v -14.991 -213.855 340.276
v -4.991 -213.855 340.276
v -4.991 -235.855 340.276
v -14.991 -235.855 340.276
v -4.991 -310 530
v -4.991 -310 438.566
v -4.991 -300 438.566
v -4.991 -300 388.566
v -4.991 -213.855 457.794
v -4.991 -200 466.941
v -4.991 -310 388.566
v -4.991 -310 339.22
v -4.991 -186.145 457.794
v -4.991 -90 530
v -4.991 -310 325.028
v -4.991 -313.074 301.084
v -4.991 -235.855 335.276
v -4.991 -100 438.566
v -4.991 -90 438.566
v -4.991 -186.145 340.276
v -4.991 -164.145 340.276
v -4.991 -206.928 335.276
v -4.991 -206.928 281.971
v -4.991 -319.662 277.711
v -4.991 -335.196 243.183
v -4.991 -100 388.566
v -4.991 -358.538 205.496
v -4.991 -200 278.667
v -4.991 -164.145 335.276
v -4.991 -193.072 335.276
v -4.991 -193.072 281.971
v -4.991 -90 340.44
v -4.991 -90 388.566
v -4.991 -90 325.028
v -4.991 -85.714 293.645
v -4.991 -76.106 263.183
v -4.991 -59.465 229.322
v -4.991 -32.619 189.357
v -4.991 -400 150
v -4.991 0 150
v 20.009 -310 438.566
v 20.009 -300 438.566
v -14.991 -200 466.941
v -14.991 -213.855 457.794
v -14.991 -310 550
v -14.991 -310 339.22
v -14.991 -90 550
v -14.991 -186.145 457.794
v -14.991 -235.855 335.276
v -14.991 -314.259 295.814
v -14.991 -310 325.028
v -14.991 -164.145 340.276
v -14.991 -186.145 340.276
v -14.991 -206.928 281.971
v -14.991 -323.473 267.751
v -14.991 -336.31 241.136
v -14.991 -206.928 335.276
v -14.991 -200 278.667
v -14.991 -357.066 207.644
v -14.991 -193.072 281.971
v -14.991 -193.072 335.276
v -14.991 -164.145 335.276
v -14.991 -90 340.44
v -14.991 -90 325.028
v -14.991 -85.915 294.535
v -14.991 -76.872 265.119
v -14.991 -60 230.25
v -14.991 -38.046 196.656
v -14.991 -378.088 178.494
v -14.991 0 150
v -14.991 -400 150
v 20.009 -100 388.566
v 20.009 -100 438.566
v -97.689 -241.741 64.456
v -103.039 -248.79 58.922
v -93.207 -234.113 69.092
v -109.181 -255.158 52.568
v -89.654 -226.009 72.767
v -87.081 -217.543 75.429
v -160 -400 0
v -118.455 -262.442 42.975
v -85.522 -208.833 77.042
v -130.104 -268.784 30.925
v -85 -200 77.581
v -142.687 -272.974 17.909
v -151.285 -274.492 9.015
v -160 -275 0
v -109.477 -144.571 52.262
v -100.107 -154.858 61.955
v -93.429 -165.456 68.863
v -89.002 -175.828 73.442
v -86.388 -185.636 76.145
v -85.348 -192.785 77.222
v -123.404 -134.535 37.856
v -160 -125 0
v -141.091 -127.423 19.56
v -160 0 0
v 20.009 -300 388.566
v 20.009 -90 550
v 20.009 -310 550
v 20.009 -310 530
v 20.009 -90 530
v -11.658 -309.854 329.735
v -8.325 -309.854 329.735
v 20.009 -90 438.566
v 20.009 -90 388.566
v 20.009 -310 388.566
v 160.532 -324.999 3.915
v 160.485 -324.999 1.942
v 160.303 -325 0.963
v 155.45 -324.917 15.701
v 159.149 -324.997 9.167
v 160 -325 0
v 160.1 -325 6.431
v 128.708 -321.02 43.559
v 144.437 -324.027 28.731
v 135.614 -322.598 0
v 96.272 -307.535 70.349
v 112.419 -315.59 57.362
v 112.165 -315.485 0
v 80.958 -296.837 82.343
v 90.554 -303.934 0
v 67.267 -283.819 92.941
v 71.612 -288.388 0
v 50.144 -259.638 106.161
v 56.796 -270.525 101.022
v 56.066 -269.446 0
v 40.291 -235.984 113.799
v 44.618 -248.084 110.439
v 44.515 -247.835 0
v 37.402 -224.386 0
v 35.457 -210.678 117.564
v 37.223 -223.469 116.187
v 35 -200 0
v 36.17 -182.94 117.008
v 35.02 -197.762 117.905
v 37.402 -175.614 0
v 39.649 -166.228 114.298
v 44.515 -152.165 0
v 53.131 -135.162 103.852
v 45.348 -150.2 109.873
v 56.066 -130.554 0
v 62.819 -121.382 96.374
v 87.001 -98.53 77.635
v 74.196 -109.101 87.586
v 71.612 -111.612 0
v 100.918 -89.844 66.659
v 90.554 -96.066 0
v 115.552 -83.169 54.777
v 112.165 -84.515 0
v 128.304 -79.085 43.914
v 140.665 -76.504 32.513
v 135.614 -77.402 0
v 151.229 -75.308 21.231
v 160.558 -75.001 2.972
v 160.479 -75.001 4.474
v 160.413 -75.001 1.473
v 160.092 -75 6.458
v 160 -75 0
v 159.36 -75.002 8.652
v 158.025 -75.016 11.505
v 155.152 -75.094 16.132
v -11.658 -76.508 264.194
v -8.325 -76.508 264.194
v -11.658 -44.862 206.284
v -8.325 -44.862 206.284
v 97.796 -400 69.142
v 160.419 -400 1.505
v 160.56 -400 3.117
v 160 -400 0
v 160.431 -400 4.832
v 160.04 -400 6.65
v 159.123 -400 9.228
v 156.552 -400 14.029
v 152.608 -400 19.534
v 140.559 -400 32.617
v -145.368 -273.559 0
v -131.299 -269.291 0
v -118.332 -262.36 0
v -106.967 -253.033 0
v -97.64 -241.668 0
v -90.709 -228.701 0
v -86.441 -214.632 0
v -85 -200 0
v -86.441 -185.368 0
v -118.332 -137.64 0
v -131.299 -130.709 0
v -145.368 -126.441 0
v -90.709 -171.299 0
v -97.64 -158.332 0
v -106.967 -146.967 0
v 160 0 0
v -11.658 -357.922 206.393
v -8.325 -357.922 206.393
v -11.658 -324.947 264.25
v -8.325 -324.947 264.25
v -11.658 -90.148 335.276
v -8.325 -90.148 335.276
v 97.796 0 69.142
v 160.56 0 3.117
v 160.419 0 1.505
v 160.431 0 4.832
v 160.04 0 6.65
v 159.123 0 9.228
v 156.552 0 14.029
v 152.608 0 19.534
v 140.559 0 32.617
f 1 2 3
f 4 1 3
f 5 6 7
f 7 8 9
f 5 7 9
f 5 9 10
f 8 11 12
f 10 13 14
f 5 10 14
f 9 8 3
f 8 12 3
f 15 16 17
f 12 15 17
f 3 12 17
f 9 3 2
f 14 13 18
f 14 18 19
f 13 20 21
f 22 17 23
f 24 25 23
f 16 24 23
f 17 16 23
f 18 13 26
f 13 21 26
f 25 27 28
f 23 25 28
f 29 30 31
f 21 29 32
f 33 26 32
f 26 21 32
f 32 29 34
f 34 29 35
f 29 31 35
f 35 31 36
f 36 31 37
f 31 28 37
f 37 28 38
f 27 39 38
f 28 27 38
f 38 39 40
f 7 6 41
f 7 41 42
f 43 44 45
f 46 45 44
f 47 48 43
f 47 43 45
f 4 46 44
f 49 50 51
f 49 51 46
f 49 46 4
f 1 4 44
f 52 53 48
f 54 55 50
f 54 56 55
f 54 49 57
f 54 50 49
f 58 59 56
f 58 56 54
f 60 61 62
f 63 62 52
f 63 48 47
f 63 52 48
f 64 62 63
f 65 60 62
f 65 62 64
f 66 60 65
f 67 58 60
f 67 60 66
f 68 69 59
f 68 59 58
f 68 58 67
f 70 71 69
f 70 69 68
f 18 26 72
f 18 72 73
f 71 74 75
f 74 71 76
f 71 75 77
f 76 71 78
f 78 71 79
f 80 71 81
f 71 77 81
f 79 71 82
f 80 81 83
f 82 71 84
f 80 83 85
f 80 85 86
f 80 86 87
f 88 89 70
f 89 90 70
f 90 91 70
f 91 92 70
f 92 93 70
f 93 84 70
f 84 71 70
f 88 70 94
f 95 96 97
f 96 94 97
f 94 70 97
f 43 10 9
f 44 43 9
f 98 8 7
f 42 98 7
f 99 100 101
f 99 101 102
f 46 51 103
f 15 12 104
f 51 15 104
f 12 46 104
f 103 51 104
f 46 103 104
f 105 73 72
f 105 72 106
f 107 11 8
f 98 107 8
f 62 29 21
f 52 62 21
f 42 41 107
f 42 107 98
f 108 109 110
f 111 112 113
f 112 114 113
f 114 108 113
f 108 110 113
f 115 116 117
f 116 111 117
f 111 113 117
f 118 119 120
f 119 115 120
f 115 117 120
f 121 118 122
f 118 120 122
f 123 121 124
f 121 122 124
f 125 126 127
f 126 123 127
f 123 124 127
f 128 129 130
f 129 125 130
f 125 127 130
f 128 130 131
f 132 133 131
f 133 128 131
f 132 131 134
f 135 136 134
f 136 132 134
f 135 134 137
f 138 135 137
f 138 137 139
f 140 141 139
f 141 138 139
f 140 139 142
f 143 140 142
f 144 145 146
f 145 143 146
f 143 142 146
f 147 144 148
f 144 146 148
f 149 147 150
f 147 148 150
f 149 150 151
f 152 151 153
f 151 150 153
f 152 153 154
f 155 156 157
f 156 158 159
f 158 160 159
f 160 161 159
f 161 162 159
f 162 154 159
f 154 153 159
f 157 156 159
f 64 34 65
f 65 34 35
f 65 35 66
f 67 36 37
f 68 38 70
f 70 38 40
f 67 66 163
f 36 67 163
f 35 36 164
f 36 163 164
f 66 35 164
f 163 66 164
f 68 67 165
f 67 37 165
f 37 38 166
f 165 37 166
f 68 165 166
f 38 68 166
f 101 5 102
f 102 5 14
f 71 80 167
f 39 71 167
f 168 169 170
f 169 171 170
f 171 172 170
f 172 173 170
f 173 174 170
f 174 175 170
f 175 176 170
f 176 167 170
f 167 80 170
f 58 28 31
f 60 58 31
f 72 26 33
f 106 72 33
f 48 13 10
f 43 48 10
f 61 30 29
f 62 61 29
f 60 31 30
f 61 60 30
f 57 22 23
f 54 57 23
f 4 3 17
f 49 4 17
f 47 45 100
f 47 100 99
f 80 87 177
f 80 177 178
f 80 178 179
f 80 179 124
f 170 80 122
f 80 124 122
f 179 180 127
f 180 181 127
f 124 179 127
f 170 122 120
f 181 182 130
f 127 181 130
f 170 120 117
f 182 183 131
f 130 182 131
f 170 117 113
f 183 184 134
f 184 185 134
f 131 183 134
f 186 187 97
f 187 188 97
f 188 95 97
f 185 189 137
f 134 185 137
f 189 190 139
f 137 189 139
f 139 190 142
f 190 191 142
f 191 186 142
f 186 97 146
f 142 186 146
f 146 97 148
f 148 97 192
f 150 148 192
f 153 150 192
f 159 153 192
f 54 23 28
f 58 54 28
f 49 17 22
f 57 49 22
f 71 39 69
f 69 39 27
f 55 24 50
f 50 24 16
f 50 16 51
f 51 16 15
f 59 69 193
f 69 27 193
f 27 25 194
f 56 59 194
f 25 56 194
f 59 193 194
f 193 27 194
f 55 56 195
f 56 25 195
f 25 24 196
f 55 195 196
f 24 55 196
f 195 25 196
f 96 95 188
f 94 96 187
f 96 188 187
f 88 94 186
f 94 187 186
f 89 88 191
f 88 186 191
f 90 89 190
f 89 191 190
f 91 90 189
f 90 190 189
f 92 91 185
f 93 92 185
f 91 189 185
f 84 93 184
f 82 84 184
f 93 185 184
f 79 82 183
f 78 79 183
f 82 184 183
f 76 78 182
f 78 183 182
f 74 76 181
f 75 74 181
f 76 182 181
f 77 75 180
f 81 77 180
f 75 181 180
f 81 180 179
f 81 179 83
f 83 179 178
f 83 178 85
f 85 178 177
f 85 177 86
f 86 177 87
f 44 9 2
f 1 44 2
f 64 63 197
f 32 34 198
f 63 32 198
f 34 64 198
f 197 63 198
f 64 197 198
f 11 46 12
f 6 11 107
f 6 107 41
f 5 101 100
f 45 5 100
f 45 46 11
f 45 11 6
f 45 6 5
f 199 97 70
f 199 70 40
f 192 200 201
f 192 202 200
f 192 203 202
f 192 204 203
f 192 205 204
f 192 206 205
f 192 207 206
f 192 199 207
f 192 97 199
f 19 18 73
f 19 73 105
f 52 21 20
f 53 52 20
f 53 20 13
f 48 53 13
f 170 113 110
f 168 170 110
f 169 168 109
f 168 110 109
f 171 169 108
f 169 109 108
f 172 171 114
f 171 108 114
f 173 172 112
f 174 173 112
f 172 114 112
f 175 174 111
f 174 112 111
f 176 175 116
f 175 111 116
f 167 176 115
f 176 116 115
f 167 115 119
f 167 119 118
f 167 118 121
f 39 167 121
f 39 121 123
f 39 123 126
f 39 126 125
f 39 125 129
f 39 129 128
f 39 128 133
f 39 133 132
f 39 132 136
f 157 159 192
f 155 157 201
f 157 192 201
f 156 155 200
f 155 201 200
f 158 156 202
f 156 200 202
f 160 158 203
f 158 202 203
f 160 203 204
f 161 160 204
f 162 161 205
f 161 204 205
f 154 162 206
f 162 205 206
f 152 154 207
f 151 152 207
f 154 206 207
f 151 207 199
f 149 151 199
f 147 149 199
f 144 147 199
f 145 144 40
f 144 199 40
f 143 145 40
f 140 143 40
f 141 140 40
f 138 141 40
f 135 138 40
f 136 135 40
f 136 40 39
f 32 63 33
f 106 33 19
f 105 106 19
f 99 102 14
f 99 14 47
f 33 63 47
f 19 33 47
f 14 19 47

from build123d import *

# Parameters (mm, degrees)
F1_DEPTH  = 400
F2_R      = 75
F2_R_2    = 125
F3_DEPTH  = 160
F4_W      = 10
F4_H      = 400
F5_DEPTH  = 400
F7_DEPTH  = 369
F8_DEPTH  = 744
F9_DEPTH  = 294
F10_DEPTH = 25
F11_W     = 220
F11_H     = 20
F12_DEPTH = 25
F13_W     = 10
F13_H     = 50
F14_DEPTH = 25


with BuildPart() as f1:
    # F0 (on Front) → F1 (new body)
    with BuildSketch(Plane.XZ):
        with BuildLine():
            Line((-10, 0), (0, 0))
            Line((0, 0), (160, 0))
            add(Edge.make_bspline(
                [(160, 0), (168.8577404315, 22.9710926099), (70.8040622396, 86.9003880522), (-4.9911788106, 150)],
                knots=[0.4586039165, 0.4586039165, 0.4586039165, 0.4586039165, 1, 1, 1, 1], degree=3))
            Line((-4.9911788106, 150), (-14.9911788106, 150))
            Line((-14.9911788106, 150), (-160, 0))
            Line((-160, 0), (-60, 0))
            Line((-60, 0), (-10, 0))
        make_face()
    extrude(amount=F1_DEPTH)

    # F2 (on face) → F3 (cut)
    with BuildSketch(Plane(origin=(0, 0, 0), x_dir=(1, 0, 0), z_dir=(0, 0, -1))):
        with Locations((-160, 200)):
            Circle(F2_R)
        with Locations((160, 200)):
            Circle(F2_R_2)
    extrude(amount=-F3_DEPTH, mode=Mode.SUBTRACT)

    # F4 (on face) → F5 (join)
    with BuildSketch(Plane.XY.offset(150)):
        with Locations((-9.9911788106, -200)):
            Rectangle(F4_W, F4_H)
    extrude(amount=F5_DEPTH)

    # F6 (on face) → F7 (cut)
    with BuildSketch(Plane.YZ.offset(-4.9911788106)):
        with BuildLine():
            Line((-400, 550), (-400, 150))
            add(Edge.make_bspline(
                [(-400, 150), (-356.3451728041, 206.1467944777), (-312.9584078924, 262.3039541318), (-310, 325.0278234482)],
                knots=[0, 0, 0, 0, 0.4740286783, 0.4740286783, 0.4740286783, 0.4740286783], degree=3))
            Line((-310, 325.0278234482), (-310, 339.2202581751))
            add(Edge.make_bspline(
                [(-310, 339.2202581751), (-312.9911644459, 405.1052836748), (-356.3650932552, 477.5474537124), (-400, 550)],
                knots=[0.5095094707, 0.5095094707, 0.5095094707, 0.5095094707, 1, 1, 1, 1], degree=3))
        make_face()
        with BuildLine():
            Line((0, 550), (-90, 550))
            Line((-90, 550), (-90, 530))
            Line((-90, 530), (-90, 340.4403127563))
            add(Edge.make_bspline(
                [(0, 550), (-49.5785227153, 477.7428221558), (-87.2010209493, 405.969304948), (-90, 340.4403127563)],
                knots=[0, 0, 0, 0, 0.4874574601, 0.4874574601, 0.4874574601, 0.4874574601], degree=3))
        make_face()
        with BuildLine():
            Line((-310, 339.2202581751), (-310, 325.0278234482))
            add(Edge.make_bspline(
                [(-310, 325.0278234482), (-309.7785647553, 329.7226714383), (-309.7836270458, 334.4543090401), (-310, 339.2202581751)],
                knots=[0.4740286783, 0.4740286783, 0.4740286783, 0.4740286783, 0.5095094707, 0.5095094707, 0.5095094707, 0.5095094707], degree=3))
        make_face()
        with BuildLine():
            Line((-310, 550), (-400, 550))
            add(Edge.make_bspline(
                [(-310, 339.2202581751), (-312.9911644459, 405.1052836748), (-356.3650932552, 477.5474537124), (-400, 550)],
                knots=[0.5095094707, 0.5095094707, 0.5095094707, 0.5095094707, 1, 1, 1, 1], degree=3))
            Line((-310, 339.2202581751), (-310, 530))
            Line((-310, 530), (-310, 550))
        make_face()
        with BuildLine():
            Line((0, 150), (0, 550))
            add(Edge.make_bspline(
                [(0, 550), (-49.5785227153, 477.7428221558), (-87.2010209493, 405.969304948), (-90, 340.4403127563)],
                knots=[0, 0, 0, 0, 0.4874574601, 0.4874574601, 0.4874574601, 0.4874574601], degree=3))
            Line((-90, 340.4403127563), (-90, 325.0278234482))
            add(Edge.make_bspline(
                [(-90, 325.0278234482), (-87.2318561535, 262.2986085933), (-49.8238669759, 205.9050330021), (0, 150)],
                knots=[0.5259713217, 0.5259713217, 0.5259713217, 0.5259713217, 1, 1, 1, 1], degree=3))
        make_face()
        with BuildLine():
            Line((-90, 325.0278234482), (-90, 340.4403127563))
            add(Edge.make_bspline(
                [(-90, 340.4403127563), (-90.2211464603, 335.2628875556), (-90.224906032, 330.1244439943), (-90, 325.0278234482)],
                knots=[0.4874574601, 0.4874574601, 0.4874574601, 0.4874574601, 0.5259713217, 0.5259713217, 0.5259713217, 0.5259713217], degree=3))
        make_face()
        Polygon((-186.1447365284, 340.2760970592), (-186.1447365284, 457.7941475637), (-200, 466.9407904148), (-213.8552634716, 457.7941475637), (-213.8552634716, 340.2760970592), (-225.8552634716, 340.2760970592), (-235.8552634716, 340.2760970592), (-235.8552634716, 335.2760970592), (-213.8552634716, 335.2760970592), (-206.9276317358, 335.2760970592), (-206.9276317358, 281.9714009762), (-200, 278.6667048931), (-193.0723682642, 281.9714009762), (-193.0723682642, 335.2760970592), (-186.1447365284, 335.2760970592), (-164.1447365284, 335.2760970592), (-164.1447365284, 340.2760970592), (-174.1447365284, 340.2760970592), align=None)
    extrude(amount=-F7_DEPTH, mode=Mode.SUBTRACT)

    # F6 (on face) → F8 (cut)
    with BuildSketch(Plane.YZ.offset(-4.9911788106)):
        with BuildLine():
            Line((-400, 550), (-400, 150))
            add(Edge.make_bspline(
                [(-400, 150), (-356.3451728041, 206.1467944777), (-312.9584078924, 262.3039541318), (-310, 325.0278234482)],
                knots=[0, 0, 0, 0, 0.4740286783, 0.4740286783, 0.4740286783, 0.4740286783], degree=3))
            Line((-310, 325.0278234482), (-310, 339.2202581751))
            add(Edge.make_bspline(
                [(-310, 339.2202581751), (-312.9911644459, 405.1052836748), (-356.3650932552, 477.5474537124), (-400, 550)],
                knots=[0.5095094707, 0.5095094707, 0.5095094707, 0.5095094707, 1, 1, 1, 1], degree=3))
        make_face()
        with BuildLine():
            Line((0, 550), (-90, 550))
            Line((-90, 550), (-90, 530))
            Line((-90, 530), (-90, 340.4403127563))
            add(Edge.make_bspline(
                [(0, 550), (-49.5785227153, 477.7428221558), (-87.2010209493, 405.969304948), (-90, 340.4403127563)],
                knots=[0, 0, 0, 0, 0.4874574601, 0.4874574601, 0.4874574601, 0.4874574601], degree=3))
        make_face()
        with BuildLine():
            Line((-310, 339.2202581751), (-310, 325.0278234482))
            add(Edge.make_bspline(
                [(-310, 325.0278234482), (-309.7785647553, 329.7226714383), (-309.7836270458, 334.4543090401), (-310, 339.2202581751)],
                knots=[0.4740286783, 0.4740286783, 0.4740286783, 0.4740286783, 0.5095094707, 0.5095094707, 0.5095094707, 0.5095094707], degree=3))
        make_face()
        with BuildLine():
            Line((-310, 550), (-400, 550))
            add(Edge.make_bspline(
                [(-310, 339.2202581751), (-312.9911644459, 405.1052836748), (-356.3650932552, 477.5474537124), (-400, 550)],
                knots=[0.5095094707, 0.5095094707, 0.5095094707, 0.5095094707, 1, 1, 1, 1], degree=3))
            Line((-310, 339.2202581751), (-310, 530))
            Line((-310, 530), (-310, 550))
        make_face()
        with BuildLine():
            Line((0, 150), (0, 550))
            add(Edge.make_bspline(
                [(0, 550), (-49.5785227153, 477.7428221558), (-87.2010209493, 405.969304948), (-90, 340.4403127563)],
                knots=[0, 0, 0, 0, 0.4874574601, 0.4874574601, 0.4874574601, 0.4874574601], degree=3))
            Line((-90, 340.4403127563), (-90, 325.0278234482))
            add(Edge.make_bspline(
                [(-90, 325.0278234482), (-87.2318561535, 262.2986085933), (-49.8238669759, 205.9050330021), (0, 150)],
                knots=[0.5259713217, 0.5259713217, 0.5259713217, 0.5259713217, 1, 1, 1, 1], degree=3))
        make_face()
        with BuildLine():
            Line((-90, 325.0278234482), (-90, 340.4403127563))
            add(Edge.make_bspline(
                [(-90, 340.4403127563), (-90.2211464603, 335.2628875556), (-90.224906032, 330.1244439943), (-90, 325.0278234482)],
                knots=[0.4874574601, 0.4874574601, 0.4874574601, 0.4874574601, 0.5259713217, 0.5259713217, 0.5259713217, 0.5259713217], degree=3))
        make_face()
        Polygon((-186.1447365284, 340.2760970592), (-186.1447365284, 457.7941475637), (-200, 466.9407904148), (-213.8552634716, 457.7941475637), (-213.8552634716, 340.2760970592), (-225.8552634716, 340.2760970592), (-235.8552634716, 340.2760970592), (-235.8552634716, 335.2760970592), (-213.8552634716, 335.2760970592), (-206.9276317358, 335.2760970592), (-206.9276317358, 281.9714009762), (-200, 278.6667048931), (-193.0723682642, 281.9714009762), (-193.0723682642, 335.2760970592), (-186.1447365284, 335.2760970592), (-164.1447365284, 335.2760970592), (-164.1447365284, 340.2760970592), (-174.1447365284, 340.2760970592), align=None)
    extrude(amount=-F8_DEPTH, mode=Mode.SUBTRACT)

    # F6 (on face) → F9 (cut)
    with BuildSketch(Plane.YZ.offset(-4.9911788106)):
        with BuildLine():
            Line((-400, 550), (-400, 150))
            add(Edge.make_bspline(
                [(-400, 150), (-356.3451728041, 206.1467944777), (-312.9584078924, 262.3039541318), (-310, 325.0278234482)],
                knots=[0, 0, 0, 0, 0.4740286783, 0.4740286783, 0.4740286783, 0.4740286783], degree=3))
            Line((-310, 325.0278234482), (-310, 339.2202581751))
            add(Edge.make_bspline(
                [(-310, 339.2202581751), (-312.9911644459, 405.1052836748), (-356.3650932552, 477.5474537124), (-400, 550)],
                knots=[0.5095094707, 0.5095094707, 0.5095094707, 0.5095094707, 1, 1, 1, 1], degree=3))
        make_face()
        with BuildLine():
            Line((0, 550), (-90, 550))
            Line((-90, 550), (-90, 530))
            Line((-90, 530), (-90, 340.4403127563))
            add(Edge.make_bspline(
                [(0, 550), (-49.5785227153, 477.7428221558), (-87.2010209493, 405.969304948), (-90, 340.4403127563)],
                knots=[0, 0, 0, 0, 0.4874574601, 0.4874574601, 0.4874574601, 0.4874574601], degree=3))
        make_face()
        with BuildLine():
            Line((-310, 339.2202581751), (-310, 325.0278234482))
            add(Edge.make_bspline(
                [(-310, 325.0278234482), (-309.7785647553, 329.7226714383), (-309.7836270458, 334.4543090401), (-310, 339.2202581751)],
                knots=[0.4740286783, 0.4740286783, 0.4740286783, 0.4740286783, 0.5095094707, 0.5095094707, 0.5095094707, 0.5095094707], degree=3))
        make_face()
        with BuildLine():
            Line((-310, 550), (-400, 550))
            add(Edge.make_bspline(
                [(-310, 339.2202581751), (-312.9911644459, 405.1052836748), (-356.3650932552, 477.5474537124), (-400, 550)],
                knots=[0.5095094707, 0.5095094707, 0.5095094707, 0.5095094707, 1, 1, 1, 1], degree=3))
            Line((-310, 339.2202581751), (-310, 530))
            Line((-310, 530), (-310, 550))
        make_face()
        with BuildLine():
            Line((0, 150), (0, 550))
            add(Edge.make_bspline(
                [(0, 550), (-49.5785227153, 477.7428221558), (-87.2010209493, 405.969304948), (-90, 340.4403127563)],
                knots=[0, 0, 0, 0, 0.4874574601, 0.4874574601, 0.4874574601, 0.4874574601], degree=3))
            Line((-90, 340.4403127563), (-90, 325.0278234482))
            add(Edge.make_bspline(
                [(-90, 325.0278234482), (-87.2318561535, 262.2986085933), (-49.8238669759, 205.9050330021), (0, 150)],
                knots=[0.5259713217, 0.5259713217, 0.5259713217, 0.5259713217, 1, 1, 1, 1], degree=3))
        make_face()
        with BuildLine():
            Line((-90, 325.0278234482), (-90, 340.4403127563))
            add(Edge.make_bspline(
                [(-90, 340.4403127563), (-90.2211464603, 335.2628875556), (-90.224906032, 330.1244439943), (-90, 325.0278234482)],
                knots=[0.4874574601, 0.4874574601, 0.4874574601, 0.4874574601, 0.5259713217, 0.5259713217, 0.5259713217, 0.5259713217], degree=3))
        make_face()
        Polygon((-186.1447365284, 340.2760970592), (-186.1447365284, 457.7941475637), (-200, 466.9407904148), (-213.8552634716, 457.7941475637), (-213.8552634716, 340.2760970592), (-225.8552634716, 340.2760970592), (-235.8552634716, 340.2760970592), (-235.8552634716, 335.2760970592), (-213.8552634716, 335.2760970592), (-206.9276317358, 335.2760970592), (-206.9276317358, 281.9714009762), (-200, 278.6667048931), (-193.0723682642, 281.9714009762), (-193.0723682642, 335.2760970592), (-186.1447365284, 335.2760970592), (-164.1447365284, 335.2760970592), (-164.1447365284, 340.2760970592), (-174.1447365284, 340.2760970592), align=None)
    extrude(amount=-F9_DEPTH, mode=Mode.SUBTRACT)

    # F6 (on face) → F10 (cut)
    with BuildSketch(Plane.YZ.offset(-4.9911788106)):
        with BuildLine():
            Line((-400, 550), (-400, 150))
            add(Edge.make_bspline(
                [(-400, 150), (-356.3451728041, 206.1467944777), (-312.9584078924, 262.3039541318), (-310, 325.0278234482)],
                knots=[0, 0, 0, 0, 0.4740286783, 0.4740286783, 0.4740286783, 0.4740286783], degree=3))
            Line((-310, 325.0278234482), (-310, 339.2202581751))
            add(Edge.make_bspline(
                [(-310, 339.2202581751), (-312.9911644459, 405.1052836748), (-356.3650932552, 477.5474537124), (-400, 550)],
                knots=[0.5095094707, 0.5095094707, 0.5095094707, 0.5095094707, 1, 1, 1, 1], degree=3))
        make_face()
        with BuildLine():
            Line((0, 550), (-90, 550))
            Line((-90, 550), (-90, 530))
            Line((-90, 530), (-90, 340.4403127563))
            add(Edge.make_bspline(
                [(0, 550), (-49.5785227153, 477.7428221558), (-87.2010209493, 405.969304948), (-90, 340.4403127563)],
                knots=[0, 0, 0, 0, 0.4874574601, 0.4874574601, 0.4874574601, 0.4874574601], degree=3))
        make_face()
        with BuildLine():
            Line((-310, 339.2202581751), (-310, 325.0278234482))
            add(Edge.make_bspline(
                [(-310, 325.0278234482), (-309.7785647553, 329.7226714383), (-309.7836270458, 334.4543090401), (-310, 339.2202581751)],
                knots=[0.4740286783, 0.4740286783, 0.4740286783, 0.4740286783, 0.5095094707, 0.5095094707, 0.5095094707, 0.5095094707], degree=3))
        make_face()
        with BuildLine():
            Line((-310, 550), (-400, 550))
            add(Edge.make_bspline(
                [(-310, 339.2202581751), (-312.9911644459, 405.1052836748), (-356.3650932552, 477.5474537124), (-400, 550)],
                knots=[0.5095094707, 0.5095094707, 0.5095094707, 0.5095094707, 1, 1, 1, 1], degree=3))
            Line((-310, 339.2202581751), (-310, 530))
            Line((-310, 530), (-310, 550))
        make_face()
        with BuildLine():
            Line((0, 150), (0, 550))
            add(Edge.make_bspline(
                [(0, 550), (-49.5785227153, 477.7428221558), (-87.2010209493, 405.969304948), (-90, 340.4403127563)],
                knots=[0, 0, 0, 0, 0.4874574601, 0.4874574601, 0.4874574601, 0.4874574601], degree=3))
            Line((-90, 340.4403127563), (-90, 325.0278234482))
            add(Edge.make_bspline(
                [(-90, 325.0278234482), (-87.2318561535, 262.2986085933), (-49.8238669759, 205.9050330021), (0, 150)],
                knots=[0.5259713217, 0.5259713217, 0.5259713217, 0.5259713217, 1, 1, 1, 1], degree=3))
        make_face()
        with BuildLine():
            Line((-90, 325.0278234482), (-90, 340.4403127563))
            add(Edge.make_bspline(
                [(-90, 340.4403127563), (-90.2211464603, 335.2628875556), (-90.224906032, 330.1244439943), (-90, 325.0278234482)],
                knots=[0.4874574601, 0.4874574601, 0.4874574601, 0.4874574601, 0.5259713217, 0.5259713217, 0.5259713217, 0.5259713217], degree=3))
        make_face()
        Polygon((-186.1447365284, 340.2760970592), (-186.1447365284, 457.7941475637), (-200, 466.9407904148), (-213.8552634716, 457.7941475637), (-213.8552634716, 340.2760970592), (-225.8552634716, 340.2760970592), (-235.8552634716, 340.2760970592), (-235.8552634716, 335.2760970592), (-213.8552634716, 335.2760970592), (-206.9276317358, 335.2760970592), (-206.9276317358, 281.9714009762), (-200, 278.6667048931), (-193.0723682642, 281.9714009762), (-193.0723682642, 335.2760970592), (-186.1447365284, 335.2760970592), (-164.1447365284, 335.2760970592), (-164.1447365284, 340.2760970592), (-174.1447365284, 340.2760970592), align=None)
    extrude(amount=-F10_DEPTH, mode=Mode.SUBTRACT)

    # F11 (on face) → F12 (join)
    with BuildSketch(Plane.YZ.offset(-4.9911788106)):
        with Locations((-200, 540)):
            Rectangle(F11_W, F11_H)
    extrude(amount=F12_DEPTH)

    # F13 (on face) → F14 (join)
    with BuildSketch(Plane.YZ.offset(-4.9911788106)):
        with Locations((-305, 413.565659523)):
            Rectangle(F13_W, F13_H)
        with Locations((-95, 413.565659523)):
            Rectangle(F13_W, F13_H)
    extrude(amount=F14_DEPTH)


solid = f1.part
